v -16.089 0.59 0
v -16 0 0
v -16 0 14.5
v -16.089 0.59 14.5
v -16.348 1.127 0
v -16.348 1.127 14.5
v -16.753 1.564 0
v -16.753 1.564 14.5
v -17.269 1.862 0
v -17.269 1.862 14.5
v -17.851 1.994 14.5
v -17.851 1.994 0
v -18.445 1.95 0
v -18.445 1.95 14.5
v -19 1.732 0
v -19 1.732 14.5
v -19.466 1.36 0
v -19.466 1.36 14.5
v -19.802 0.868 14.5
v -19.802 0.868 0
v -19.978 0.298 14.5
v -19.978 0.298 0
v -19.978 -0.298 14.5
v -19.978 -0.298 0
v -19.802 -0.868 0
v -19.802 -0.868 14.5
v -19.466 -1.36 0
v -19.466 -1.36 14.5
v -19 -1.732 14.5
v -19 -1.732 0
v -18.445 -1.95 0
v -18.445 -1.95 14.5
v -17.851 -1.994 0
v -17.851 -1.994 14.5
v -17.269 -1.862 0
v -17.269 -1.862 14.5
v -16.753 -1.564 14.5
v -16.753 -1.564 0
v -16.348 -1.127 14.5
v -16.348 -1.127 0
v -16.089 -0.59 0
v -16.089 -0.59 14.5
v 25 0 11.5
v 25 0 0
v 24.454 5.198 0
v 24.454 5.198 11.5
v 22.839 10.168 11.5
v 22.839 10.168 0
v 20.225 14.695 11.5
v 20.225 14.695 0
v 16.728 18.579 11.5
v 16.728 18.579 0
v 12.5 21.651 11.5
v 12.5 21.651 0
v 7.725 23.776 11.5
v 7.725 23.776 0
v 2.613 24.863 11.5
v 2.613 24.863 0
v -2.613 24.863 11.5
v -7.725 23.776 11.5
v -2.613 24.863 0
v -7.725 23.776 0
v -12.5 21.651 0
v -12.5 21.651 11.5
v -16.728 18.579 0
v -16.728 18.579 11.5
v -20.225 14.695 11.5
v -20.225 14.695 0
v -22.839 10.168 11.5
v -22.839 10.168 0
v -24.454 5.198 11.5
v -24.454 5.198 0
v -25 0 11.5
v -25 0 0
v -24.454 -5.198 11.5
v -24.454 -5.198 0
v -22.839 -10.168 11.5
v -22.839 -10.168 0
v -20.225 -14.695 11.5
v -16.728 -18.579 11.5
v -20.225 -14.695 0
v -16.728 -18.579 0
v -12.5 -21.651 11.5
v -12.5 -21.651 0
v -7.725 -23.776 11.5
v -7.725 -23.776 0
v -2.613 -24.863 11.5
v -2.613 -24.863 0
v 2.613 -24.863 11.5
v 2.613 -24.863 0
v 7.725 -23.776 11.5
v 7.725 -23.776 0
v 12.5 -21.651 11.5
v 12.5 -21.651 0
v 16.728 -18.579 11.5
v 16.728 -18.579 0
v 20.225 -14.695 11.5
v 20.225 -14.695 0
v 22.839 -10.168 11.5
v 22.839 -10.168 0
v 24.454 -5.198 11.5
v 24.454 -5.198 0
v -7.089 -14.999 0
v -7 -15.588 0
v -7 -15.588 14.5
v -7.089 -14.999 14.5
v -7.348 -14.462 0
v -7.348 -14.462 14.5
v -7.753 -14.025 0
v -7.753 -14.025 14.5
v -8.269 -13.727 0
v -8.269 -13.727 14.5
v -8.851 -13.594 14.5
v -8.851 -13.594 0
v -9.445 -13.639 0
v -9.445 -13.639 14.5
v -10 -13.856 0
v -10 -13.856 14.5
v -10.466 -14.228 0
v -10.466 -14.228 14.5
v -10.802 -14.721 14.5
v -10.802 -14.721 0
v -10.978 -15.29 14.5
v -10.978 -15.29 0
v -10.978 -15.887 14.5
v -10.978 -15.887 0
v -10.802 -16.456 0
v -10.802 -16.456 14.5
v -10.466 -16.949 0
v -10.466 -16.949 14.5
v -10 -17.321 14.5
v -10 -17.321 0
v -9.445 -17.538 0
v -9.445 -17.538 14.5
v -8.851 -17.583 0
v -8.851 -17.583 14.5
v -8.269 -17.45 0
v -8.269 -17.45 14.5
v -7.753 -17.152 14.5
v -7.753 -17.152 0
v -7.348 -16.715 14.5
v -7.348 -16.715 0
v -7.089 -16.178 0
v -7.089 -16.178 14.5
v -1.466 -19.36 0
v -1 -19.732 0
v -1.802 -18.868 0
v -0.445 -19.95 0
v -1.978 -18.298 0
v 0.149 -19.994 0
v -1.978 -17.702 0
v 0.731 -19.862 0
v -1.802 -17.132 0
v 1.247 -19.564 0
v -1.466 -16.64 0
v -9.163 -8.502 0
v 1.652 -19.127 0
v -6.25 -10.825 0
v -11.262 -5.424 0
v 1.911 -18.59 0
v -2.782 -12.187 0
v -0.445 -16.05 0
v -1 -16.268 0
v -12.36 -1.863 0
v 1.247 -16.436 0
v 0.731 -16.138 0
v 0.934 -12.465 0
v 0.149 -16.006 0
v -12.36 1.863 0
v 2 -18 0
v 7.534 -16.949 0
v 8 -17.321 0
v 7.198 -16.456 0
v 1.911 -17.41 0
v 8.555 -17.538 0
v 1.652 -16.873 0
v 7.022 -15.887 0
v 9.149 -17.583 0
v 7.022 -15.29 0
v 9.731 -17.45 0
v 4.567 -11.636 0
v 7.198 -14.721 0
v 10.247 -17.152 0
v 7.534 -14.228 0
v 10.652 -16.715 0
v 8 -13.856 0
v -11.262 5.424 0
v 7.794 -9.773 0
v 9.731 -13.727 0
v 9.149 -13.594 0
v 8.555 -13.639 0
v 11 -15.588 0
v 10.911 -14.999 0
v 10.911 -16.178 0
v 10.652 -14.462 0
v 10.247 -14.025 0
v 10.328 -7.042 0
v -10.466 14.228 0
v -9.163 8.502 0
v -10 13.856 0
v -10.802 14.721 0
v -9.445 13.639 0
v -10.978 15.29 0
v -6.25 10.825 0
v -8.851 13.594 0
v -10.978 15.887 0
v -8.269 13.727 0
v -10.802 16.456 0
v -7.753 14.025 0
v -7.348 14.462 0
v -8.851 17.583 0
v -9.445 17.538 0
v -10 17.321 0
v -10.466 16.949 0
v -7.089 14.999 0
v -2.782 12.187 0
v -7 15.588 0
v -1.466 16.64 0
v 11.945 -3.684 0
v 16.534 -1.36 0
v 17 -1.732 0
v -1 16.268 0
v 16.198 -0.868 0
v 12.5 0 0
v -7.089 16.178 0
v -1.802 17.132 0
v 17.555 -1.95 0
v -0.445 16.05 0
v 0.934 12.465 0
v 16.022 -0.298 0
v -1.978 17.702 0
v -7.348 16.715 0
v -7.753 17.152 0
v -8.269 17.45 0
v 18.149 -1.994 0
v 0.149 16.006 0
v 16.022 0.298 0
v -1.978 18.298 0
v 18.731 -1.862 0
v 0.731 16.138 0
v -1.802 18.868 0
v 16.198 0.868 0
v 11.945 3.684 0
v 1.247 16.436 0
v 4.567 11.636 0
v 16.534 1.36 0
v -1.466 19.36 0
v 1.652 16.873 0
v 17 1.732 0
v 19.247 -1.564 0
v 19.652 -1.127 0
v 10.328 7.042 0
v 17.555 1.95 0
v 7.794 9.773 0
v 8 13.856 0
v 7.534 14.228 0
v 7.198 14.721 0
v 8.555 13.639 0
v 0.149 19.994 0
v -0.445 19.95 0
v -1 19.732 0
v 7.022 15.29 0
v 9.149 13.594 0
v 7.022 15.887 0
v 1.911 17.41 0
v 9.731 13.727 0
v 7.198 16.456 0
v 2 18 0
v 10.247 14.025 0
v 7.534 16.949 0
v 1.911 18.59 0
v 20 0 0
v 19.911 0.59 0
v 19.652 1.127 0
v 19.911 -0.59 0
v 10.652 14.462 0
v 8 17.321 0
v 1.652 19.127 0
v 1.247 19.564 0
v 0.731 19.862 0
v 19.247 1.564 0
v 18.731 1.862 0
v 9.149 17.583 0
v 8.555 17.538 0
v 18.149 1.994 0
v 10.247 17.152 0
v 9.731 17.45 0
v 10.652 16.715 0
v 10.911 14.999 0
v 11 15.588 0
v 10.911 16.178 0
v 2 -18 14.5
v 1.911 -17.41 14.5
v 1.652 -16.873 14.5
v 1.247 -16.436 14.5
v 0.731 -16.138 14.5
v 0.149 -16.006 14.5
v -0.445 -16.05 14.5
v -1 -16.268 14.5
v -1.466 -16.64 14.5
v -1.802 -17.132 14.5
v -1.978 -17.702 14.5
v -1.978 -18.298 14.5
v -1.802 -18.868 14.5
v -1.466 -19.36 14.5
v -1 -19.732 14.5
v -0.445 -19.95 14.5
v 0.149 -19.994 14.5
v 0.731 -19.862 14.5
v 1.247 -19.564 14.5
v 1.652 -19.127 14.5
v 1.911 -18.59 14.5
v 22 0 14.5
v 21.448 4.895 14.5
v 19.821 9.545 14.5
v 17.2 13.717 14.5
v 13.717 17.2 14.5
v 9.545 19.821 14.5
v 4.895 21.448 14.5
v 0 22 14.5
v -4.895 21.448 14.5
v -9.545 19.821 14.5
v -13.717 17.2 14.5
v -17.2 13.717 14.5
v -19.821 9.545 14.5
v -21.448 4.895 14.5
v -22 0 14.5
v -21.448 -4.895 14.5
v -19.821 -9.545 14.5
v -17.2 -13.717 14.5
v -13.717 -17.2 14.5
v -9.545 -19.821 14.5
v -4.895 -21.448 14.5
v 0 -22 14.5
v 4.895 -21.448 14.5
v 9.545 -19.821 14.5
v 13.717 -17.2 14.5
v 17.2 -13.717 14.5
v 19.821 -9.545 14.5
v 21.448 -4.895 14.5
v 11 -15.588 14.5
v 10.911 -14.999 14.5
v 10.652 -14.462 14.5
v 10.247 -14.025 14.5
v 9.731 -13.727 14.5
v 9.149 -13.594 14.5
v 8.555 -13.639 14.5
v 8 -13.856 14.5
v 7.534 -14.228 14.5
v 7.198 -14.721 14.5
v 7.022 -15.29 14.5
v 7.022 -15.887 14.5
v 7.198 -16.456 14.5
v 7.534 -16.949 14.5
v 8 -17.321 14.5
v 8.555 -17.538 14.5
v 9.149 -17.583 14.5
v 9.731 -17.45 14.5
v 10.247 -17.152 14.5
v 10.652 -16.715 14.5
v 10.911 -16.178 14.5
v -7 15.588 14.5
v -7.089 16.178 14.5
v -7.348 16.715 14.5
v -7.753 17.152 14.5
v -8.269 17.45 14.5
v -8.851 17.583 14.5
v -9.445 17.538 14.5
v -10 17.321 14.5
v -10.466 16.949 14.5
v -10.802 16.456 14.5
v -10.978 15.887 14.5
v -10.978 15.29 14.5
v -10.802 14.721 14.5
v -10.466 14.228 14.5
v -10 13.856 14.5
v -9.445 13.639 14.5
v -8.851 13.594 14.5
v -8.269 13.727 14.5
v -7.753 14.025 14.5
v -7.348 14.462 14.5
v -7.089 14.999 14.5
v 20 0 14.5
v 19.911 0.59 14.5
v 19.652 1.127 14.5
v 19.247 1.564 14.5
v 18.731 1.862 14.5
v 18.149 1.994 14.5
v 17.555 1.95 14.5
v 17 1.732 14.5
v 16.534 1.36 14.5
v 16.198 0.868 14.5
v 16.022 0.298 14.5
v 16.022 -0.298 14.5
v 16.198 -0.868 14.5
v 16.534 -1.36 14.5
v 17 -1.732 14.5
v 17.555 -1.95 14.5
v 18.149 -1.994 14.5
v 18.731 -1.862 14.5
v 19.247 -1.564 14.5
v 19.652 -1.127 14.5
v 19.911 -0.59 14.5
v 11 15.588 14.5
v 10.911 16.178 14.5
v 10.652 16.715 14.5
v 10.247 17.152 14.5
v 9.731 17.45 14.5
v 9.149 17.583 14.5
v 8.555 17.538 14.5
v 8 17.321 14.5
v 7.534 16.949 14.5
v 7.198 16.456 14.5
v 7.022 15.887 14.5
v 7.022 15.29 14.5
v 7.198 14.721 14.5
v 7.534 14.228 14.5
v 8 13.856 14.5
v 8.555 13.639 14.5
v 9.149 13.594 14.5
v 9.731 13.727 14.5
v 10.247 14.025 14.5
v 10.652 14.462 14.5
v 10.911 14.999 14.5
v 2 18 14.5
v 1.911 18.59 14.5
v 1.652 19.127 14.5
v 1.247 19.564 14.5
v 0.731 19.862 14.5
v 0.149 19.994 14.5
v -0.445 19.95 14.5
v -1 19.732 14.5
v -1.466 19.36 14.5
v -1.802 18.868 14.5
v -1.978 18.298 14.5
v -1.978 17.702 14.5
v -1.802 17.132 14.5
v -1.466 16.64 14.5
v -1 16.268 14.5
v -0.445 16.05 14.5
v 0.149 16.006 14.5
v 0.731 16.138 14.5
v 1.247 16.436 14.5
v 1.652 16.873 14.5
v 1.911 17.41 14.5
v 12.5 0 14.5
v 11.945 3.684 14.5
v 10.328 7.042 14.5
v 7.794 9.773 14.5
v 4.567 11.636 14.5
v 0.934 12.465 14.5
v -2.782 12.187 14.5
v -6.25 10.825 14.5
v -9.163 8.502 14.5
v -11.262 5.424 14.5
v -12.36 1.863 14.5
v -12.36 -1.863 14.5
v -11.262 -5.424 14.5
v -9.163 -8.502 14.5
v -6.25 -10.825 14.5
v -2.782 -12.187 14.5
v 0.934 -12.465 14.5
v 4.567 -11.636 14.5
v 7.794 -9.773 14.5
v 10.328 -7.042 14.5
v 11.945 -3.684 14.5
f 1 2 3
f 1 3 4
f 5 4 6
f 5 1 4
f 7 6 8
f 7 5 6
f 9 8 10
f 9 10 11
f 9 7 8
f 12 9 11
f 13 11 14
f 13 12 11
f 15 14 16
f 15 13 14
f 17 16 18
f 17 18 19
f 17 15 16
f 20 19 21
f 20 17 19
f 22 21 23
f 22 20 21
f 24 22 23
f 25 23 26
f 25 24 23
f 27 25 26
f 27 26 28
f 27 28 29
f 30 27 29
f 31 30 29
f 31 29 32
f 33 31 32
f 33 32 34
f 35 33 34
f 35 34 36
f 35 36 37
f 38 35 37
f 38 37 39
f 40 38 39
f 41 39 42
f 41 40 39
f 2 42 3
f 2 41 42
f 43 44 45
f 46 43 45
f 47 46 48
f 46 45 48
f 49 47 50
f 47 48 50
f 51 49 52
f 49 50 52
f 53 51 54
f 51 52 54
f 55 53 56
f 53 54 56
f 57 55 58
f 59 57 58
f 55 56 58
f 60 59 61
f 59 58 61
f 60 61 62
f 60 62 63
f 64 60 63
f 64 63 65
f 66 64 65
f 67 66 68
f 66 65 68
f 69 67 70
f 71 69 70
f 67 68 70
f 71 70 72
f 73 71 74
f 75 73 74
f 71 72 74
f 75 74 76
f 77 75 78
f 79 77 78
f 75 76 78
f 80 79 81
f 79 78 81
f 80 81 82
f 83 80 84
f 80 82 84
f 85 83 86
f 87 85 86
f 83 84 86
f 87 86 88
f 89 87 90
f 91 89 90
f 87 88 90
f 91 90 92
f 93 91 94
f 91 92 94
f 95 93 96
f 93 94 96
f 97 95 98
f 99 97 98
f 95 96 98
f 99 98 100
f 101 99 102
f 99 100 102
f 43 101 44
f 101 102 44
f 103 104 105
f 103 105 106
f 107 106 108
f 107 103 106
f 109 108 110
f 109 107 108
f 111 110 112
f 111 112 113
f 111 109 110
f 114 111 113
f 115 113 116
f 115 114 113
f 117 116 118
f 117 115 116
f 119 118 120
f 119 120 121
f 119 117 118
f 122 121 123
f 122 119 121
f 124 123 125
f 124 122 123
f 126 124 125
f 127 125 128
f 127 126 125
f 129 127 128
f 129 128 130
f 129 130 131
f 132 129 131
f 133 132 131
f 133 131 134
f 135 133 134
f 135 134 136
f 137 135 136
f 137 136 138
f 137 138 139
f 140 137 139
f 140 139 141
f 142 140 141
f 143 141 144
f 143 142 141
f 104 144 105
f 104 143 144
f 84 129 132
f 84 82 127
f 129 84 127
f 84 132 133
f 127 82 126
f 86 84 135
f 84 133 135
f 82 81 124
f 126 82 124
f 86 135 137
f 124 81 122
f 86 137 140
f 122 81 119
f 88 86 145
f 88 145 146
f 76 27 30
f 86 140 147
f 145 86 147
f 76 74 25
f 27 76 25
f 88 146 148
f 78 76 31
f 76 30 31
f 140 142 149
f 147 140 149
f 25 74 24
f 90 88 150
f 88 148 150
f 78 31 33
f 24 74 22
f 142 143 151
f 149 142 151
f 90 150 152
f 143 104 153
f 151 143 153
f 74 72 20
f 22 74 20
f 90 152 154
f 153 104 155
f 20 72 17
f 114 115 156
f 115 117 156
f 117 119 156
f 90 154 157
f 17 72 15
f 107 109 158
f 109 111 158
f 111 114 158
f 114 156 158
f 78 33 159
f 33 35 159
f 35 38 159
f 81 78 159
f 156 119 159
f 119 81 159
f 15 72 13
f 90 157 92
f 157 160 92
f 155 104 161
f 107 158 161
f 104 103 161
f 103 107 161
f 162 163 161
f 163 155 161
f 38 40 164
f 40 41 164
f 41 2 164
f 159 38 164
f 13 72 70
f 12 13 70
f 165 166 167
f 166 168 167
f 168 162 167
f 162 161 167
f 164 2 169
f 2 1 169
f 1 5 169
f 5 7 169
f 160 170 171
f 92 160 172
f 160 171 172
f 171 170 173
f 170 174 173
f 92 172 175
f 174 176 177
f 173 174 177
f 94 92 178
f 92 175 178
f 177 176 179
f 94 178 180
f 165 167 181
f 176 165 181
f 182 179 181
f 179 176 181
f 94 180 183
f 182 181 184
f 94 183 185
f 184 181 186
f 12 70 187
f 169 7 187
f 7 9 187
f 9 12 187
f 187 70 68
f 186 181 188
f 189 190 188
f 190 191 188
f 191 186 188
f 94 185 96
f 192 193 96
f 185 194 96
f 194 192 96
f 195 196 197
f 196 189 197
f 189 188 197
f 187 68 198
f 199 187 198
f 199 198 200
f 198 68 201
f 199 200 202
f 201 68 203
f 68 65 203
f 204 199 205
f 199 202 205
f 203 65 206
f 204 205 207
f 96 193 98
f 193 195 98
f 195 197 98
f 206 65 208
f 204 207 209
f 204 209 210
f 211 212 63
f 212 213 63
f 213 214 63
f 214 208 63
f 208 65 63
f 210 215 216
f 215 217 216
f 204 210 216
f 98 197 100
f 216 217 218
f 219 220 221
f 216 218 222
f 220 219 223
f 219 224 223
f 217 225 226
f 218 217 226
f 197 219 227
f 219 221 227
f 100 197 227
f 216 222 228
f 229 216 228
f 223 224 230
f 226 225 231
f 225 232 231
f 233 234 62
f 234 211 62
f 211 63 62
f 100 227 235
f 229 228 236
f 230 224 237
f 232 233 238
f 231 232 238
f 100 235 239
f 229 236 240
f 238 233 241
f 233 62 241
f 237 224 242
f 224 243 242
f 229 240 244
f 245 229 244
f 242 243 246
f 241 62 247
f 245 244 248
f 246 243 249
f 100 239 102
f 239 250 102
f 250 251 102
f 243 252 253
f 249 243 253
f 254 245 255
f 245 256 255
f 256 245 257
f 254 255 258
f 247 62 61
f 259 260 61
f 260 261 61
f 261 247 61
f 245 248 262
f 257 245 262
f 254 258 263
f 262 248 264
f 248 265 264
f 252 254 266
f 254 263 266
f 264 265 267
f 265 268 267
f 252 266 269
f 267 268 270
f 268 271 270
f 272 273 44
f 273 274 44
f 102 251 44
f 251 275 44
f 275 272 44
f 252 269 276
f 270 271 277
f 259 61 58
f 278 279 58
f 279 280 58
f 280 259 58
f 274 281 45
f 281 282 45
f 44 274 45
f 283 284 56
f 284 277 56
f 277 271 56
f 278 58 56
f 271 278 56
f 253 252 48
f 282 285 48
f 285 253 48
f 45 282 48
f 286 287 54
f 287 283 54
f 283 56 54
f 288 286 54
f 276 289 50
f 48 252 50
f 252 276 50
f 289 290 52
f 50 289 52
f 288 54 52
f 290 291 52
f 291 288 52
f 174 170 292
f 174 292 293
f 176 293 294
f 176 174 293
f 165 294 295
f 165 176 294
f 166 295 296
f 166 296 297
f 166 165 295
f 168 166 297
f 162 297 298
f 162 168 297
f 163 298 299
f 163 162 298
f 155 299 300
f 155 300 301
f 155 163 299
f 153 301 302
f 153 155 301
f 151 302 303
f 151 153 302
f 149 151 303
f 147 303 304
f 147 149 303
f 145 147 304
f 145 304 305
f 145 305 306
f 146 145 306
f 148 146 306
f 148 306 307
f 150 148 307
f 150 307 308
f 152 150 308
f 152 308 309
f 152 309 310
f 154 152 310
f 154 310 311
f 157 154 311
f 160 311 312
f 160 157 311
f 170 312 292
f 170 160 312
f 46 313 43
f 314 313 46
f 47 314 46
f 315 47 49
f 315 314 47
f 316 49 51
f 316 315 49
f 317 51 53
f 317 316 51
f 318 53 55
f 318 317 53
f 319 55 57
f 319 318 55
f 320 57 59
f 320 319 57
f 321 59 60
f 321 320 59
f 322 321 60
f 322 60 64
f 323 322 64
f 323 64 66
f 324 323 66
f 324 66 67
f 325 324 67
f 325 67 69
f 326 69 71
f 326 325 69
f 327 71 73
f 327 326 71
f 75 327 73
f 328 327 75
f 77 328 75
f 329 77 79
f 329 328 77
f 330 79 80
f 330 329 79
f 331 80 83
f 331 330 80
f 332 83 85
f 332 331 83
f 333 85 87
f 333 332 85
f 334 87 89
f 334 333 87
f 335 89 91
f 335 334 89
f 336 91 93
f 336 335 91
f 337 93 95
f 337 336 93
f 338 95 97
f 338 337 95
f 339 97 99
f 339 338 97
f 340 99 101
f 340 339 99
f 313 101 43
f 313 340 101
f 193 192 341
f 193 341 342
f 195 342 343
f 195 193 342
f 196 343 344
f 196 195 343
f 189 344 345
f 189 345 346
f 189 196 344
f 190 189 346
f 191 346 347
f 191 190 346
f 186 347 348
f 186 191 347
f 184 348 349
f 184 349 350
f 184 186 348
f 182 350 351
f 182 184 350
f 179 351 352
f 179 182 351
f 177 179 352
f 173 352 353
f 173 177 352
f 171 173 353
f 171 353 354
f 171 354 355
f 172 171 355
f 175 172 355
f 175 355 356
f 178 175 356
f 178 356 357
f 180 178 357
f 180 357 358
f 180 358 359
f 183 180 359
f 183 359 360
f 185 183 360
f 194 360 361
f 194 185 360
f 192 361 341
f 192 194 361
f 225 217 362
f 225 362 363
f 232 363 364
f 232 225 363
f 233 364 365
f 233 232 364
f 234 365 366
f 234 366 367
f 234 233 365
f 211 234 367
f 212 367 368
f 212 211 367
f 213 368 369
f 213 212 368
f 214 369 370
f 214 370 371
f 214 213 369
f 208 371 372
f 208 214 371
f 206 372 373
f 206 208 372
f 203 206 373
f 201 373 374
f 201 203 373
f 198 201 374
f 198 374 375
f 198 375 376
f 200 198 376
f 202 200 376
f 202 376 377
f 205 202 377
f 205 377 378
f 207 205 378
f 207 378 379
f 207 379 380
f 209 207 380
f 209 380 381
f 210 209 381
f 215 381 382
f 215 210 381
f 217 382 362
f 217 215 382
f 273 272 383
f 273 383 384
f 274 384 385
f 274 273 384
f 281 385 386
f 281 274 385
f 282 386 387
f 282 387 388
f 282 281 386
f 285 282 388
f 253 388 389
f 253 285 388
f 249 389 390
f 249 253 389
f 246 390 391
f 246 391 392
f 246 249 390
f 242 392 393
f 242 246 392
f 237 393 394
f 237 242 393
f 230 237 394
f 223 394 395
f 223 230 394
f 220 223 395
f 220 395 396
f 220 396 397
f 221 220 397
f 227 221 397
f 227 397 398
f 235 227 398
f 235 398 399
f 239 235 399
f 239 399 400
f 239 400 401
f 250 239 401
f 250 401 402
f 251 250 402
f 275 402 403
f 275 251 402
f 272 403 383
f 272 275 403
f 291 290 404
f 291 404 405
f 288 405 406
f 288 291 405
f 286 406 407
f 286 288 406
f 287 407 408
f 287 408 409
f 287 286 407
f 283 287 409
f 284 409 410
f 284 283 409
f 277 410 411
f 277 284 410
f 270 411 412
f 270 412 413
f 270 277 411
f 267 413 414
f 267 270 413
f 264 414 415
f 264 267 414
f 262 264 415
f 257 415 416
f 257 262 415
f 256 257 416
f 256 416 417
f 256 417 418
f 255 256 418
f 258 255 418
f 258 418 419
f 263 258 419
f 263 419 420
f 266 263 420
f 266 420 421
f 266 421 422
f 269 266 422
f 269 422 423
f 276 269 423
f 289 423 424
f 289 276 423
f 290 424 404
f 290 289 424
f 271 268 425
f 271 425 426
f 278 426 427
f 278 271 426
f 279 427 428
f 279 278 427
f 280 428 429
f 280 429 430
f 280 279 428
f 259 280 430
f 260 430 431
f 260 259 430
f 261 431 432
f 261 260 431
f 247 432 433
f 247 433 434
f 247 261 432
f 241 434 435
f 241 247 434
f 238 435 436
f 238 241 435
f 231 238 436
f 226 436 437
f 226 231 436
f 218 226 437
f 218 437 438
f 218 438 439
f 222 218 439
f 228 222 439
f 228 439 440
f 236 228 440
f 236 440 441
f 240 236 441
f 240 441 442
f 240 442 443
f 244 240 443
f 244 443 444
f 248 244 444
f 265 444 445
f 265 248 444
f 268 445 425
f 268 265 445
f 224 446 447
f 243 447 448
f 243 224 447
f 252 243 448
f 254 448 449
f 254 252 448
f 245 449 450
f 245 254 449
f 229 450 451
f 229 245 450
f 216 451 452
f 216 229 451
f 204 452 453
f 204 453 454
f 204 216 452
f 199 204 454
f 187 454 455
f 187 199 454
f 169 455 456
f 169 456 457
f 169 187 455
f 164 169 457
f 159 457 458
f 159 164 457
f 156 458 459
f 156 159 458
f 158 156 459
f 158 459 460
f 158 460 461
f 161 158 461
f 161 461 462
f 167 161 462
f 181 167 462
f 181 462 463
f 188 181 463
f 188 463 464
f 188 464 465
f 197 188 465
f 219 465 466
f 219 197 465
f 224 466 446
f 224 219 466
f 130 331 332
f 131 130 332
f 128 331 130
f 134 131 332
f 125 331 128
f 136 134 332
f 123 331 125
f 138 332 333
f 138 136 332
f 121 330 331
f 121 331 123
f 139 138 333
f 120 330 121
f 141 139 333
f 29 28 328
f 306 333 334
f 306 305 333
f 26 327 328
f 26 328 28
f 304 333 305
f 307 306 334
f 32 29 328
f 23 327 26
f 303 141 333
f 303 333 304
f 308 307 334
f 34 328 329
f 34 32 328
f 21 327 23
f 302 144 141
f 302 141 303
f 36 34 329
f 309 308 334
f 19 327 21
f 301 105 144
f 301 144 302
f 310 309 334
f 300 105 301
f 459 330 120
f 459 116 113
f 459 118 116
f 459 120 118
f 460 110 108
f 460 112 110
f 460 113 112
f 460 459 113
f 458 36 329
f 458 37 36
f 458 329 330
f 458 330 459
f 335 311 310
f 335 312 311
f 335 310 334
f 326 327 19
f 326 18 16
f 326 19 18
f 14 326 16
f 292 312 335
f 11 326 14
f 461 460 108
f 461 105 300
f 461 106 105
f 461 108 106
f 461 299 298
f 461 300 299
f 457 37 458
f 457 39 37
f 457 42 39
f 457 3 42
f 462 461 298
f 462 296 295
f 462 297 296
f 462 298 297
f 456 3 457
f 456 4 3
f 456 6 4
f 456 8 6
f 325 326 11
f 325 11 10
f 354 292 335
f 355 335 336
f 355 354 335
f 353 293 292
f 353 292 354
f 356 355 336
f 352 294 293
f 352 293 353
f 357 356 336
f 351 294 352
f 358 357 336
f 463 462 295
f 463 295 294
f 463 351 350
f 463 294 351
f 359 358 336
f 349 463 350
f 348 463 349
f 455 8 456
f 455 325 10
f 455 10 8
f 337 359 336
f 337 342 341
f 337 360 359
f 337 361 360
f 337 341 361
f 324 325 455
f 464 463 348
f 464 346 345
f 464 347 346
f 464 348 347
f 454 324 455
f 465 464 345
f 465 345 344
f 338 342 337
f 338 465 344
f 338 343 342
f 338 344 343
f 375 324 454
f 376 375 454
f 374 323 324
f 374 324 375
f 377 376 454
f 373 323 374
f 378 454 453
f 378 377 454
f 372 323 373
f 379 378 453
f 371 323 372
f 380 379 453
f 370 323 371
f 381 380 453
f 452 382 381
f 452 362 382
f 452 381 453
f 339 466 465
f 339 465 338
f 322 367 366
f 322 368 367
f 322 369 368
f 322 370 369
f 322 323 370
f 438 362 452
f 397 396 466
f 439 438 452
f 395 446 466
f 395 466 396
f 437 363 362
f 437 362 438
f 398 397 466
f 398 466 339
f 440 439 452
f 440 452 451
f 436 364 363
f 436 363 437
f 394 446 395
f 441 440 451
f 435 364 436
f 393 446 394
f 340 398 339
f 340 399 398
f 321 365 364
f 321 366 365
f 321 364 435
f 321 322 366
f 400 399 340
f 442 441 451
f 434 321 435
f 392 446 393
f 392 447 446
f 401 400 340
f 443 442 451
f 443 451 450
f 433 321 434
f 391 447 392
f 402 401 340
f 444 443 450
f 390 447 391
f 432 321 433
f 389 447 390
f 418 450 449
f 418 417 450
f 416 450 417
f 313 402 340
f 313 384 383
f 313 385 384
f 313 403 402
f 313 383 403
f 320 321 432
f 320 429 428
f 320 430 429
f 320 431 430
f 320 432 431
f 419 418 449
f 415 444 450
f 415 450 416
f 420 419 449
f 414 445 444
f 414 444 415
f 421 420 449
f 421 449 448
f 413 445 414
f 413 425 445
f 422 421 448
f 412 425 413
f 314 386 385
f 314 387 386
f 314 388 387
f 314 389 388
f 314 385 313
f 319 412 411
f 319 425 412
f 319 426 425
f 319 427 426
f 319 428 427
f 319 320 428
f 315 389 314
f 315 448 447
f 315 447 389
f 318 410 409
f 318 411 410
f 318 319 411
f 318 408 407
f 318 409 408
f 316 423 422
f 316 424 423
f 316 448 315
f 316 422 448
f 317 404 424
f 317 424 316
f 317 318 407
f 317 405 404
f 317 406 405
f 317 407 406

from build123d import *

# Parameters (mm, degrees)
SKETCH1_R           = 25
SKETCH1_R_2         = 12.5
SKETCH1_R_3         = 2
BOSS_EXTRUDE1_DEPTH = 14.5
CHAMFER1_SIZE       = 3


with BuildPart() as part:
    # Sketch1 → Boss-Extrude1 (new body)
    with BuildSketch(Plane.XY):
        Circle(SKETCH1_R)
        Circle(SKETCH1_R_2, mode=Mode.SUBTRACT)
        with Locations((0, 18)):
            Circle(SKETCH1_R_3, mode=Mode.SUBTRACT)
        with Locations((9, 15.588457268)):
            Circle(SKETCH1_R_3, mode=Mode.SUBTRACT)
        with Locations((18, 0)):
            Circle(SKETCH1_R_3, mode=Mode.SUBTRACT)
        with Locations((9, -15.588457268)):
            Circle(SKETCH1_R_3, mode=Mode.SUBTRACT)
        with Locations((0, -18)):
            Circle(SKETCH1_R_3, mode=Mode.SUBTRACT)
        with Locations((-9, -15.588457268)):
            Circle(SKETCH1_R_3, mode=Mode.SUBTRACT)
        with Locations((-18, 0)):
            Circle(SKETCH1_R_3, mode=Mode.SUBTRACT)
        with Locations((-9, 15.588457268)):
            Circle(SKETCH1_R_3, mode=Mode.SUBTRACT)
    extrude(amount=BOSS_EXTRUDE1_DEPTH)

    # Chamfer1
    chamfer1_edges = [part.edges().sort_by_distance(p)[0] for p in [
        (-25, 0, 14.5),
    ]]
    chamfer(chamfer1_edges, length=CHAMFER1_SIZE)


solid = part.part
